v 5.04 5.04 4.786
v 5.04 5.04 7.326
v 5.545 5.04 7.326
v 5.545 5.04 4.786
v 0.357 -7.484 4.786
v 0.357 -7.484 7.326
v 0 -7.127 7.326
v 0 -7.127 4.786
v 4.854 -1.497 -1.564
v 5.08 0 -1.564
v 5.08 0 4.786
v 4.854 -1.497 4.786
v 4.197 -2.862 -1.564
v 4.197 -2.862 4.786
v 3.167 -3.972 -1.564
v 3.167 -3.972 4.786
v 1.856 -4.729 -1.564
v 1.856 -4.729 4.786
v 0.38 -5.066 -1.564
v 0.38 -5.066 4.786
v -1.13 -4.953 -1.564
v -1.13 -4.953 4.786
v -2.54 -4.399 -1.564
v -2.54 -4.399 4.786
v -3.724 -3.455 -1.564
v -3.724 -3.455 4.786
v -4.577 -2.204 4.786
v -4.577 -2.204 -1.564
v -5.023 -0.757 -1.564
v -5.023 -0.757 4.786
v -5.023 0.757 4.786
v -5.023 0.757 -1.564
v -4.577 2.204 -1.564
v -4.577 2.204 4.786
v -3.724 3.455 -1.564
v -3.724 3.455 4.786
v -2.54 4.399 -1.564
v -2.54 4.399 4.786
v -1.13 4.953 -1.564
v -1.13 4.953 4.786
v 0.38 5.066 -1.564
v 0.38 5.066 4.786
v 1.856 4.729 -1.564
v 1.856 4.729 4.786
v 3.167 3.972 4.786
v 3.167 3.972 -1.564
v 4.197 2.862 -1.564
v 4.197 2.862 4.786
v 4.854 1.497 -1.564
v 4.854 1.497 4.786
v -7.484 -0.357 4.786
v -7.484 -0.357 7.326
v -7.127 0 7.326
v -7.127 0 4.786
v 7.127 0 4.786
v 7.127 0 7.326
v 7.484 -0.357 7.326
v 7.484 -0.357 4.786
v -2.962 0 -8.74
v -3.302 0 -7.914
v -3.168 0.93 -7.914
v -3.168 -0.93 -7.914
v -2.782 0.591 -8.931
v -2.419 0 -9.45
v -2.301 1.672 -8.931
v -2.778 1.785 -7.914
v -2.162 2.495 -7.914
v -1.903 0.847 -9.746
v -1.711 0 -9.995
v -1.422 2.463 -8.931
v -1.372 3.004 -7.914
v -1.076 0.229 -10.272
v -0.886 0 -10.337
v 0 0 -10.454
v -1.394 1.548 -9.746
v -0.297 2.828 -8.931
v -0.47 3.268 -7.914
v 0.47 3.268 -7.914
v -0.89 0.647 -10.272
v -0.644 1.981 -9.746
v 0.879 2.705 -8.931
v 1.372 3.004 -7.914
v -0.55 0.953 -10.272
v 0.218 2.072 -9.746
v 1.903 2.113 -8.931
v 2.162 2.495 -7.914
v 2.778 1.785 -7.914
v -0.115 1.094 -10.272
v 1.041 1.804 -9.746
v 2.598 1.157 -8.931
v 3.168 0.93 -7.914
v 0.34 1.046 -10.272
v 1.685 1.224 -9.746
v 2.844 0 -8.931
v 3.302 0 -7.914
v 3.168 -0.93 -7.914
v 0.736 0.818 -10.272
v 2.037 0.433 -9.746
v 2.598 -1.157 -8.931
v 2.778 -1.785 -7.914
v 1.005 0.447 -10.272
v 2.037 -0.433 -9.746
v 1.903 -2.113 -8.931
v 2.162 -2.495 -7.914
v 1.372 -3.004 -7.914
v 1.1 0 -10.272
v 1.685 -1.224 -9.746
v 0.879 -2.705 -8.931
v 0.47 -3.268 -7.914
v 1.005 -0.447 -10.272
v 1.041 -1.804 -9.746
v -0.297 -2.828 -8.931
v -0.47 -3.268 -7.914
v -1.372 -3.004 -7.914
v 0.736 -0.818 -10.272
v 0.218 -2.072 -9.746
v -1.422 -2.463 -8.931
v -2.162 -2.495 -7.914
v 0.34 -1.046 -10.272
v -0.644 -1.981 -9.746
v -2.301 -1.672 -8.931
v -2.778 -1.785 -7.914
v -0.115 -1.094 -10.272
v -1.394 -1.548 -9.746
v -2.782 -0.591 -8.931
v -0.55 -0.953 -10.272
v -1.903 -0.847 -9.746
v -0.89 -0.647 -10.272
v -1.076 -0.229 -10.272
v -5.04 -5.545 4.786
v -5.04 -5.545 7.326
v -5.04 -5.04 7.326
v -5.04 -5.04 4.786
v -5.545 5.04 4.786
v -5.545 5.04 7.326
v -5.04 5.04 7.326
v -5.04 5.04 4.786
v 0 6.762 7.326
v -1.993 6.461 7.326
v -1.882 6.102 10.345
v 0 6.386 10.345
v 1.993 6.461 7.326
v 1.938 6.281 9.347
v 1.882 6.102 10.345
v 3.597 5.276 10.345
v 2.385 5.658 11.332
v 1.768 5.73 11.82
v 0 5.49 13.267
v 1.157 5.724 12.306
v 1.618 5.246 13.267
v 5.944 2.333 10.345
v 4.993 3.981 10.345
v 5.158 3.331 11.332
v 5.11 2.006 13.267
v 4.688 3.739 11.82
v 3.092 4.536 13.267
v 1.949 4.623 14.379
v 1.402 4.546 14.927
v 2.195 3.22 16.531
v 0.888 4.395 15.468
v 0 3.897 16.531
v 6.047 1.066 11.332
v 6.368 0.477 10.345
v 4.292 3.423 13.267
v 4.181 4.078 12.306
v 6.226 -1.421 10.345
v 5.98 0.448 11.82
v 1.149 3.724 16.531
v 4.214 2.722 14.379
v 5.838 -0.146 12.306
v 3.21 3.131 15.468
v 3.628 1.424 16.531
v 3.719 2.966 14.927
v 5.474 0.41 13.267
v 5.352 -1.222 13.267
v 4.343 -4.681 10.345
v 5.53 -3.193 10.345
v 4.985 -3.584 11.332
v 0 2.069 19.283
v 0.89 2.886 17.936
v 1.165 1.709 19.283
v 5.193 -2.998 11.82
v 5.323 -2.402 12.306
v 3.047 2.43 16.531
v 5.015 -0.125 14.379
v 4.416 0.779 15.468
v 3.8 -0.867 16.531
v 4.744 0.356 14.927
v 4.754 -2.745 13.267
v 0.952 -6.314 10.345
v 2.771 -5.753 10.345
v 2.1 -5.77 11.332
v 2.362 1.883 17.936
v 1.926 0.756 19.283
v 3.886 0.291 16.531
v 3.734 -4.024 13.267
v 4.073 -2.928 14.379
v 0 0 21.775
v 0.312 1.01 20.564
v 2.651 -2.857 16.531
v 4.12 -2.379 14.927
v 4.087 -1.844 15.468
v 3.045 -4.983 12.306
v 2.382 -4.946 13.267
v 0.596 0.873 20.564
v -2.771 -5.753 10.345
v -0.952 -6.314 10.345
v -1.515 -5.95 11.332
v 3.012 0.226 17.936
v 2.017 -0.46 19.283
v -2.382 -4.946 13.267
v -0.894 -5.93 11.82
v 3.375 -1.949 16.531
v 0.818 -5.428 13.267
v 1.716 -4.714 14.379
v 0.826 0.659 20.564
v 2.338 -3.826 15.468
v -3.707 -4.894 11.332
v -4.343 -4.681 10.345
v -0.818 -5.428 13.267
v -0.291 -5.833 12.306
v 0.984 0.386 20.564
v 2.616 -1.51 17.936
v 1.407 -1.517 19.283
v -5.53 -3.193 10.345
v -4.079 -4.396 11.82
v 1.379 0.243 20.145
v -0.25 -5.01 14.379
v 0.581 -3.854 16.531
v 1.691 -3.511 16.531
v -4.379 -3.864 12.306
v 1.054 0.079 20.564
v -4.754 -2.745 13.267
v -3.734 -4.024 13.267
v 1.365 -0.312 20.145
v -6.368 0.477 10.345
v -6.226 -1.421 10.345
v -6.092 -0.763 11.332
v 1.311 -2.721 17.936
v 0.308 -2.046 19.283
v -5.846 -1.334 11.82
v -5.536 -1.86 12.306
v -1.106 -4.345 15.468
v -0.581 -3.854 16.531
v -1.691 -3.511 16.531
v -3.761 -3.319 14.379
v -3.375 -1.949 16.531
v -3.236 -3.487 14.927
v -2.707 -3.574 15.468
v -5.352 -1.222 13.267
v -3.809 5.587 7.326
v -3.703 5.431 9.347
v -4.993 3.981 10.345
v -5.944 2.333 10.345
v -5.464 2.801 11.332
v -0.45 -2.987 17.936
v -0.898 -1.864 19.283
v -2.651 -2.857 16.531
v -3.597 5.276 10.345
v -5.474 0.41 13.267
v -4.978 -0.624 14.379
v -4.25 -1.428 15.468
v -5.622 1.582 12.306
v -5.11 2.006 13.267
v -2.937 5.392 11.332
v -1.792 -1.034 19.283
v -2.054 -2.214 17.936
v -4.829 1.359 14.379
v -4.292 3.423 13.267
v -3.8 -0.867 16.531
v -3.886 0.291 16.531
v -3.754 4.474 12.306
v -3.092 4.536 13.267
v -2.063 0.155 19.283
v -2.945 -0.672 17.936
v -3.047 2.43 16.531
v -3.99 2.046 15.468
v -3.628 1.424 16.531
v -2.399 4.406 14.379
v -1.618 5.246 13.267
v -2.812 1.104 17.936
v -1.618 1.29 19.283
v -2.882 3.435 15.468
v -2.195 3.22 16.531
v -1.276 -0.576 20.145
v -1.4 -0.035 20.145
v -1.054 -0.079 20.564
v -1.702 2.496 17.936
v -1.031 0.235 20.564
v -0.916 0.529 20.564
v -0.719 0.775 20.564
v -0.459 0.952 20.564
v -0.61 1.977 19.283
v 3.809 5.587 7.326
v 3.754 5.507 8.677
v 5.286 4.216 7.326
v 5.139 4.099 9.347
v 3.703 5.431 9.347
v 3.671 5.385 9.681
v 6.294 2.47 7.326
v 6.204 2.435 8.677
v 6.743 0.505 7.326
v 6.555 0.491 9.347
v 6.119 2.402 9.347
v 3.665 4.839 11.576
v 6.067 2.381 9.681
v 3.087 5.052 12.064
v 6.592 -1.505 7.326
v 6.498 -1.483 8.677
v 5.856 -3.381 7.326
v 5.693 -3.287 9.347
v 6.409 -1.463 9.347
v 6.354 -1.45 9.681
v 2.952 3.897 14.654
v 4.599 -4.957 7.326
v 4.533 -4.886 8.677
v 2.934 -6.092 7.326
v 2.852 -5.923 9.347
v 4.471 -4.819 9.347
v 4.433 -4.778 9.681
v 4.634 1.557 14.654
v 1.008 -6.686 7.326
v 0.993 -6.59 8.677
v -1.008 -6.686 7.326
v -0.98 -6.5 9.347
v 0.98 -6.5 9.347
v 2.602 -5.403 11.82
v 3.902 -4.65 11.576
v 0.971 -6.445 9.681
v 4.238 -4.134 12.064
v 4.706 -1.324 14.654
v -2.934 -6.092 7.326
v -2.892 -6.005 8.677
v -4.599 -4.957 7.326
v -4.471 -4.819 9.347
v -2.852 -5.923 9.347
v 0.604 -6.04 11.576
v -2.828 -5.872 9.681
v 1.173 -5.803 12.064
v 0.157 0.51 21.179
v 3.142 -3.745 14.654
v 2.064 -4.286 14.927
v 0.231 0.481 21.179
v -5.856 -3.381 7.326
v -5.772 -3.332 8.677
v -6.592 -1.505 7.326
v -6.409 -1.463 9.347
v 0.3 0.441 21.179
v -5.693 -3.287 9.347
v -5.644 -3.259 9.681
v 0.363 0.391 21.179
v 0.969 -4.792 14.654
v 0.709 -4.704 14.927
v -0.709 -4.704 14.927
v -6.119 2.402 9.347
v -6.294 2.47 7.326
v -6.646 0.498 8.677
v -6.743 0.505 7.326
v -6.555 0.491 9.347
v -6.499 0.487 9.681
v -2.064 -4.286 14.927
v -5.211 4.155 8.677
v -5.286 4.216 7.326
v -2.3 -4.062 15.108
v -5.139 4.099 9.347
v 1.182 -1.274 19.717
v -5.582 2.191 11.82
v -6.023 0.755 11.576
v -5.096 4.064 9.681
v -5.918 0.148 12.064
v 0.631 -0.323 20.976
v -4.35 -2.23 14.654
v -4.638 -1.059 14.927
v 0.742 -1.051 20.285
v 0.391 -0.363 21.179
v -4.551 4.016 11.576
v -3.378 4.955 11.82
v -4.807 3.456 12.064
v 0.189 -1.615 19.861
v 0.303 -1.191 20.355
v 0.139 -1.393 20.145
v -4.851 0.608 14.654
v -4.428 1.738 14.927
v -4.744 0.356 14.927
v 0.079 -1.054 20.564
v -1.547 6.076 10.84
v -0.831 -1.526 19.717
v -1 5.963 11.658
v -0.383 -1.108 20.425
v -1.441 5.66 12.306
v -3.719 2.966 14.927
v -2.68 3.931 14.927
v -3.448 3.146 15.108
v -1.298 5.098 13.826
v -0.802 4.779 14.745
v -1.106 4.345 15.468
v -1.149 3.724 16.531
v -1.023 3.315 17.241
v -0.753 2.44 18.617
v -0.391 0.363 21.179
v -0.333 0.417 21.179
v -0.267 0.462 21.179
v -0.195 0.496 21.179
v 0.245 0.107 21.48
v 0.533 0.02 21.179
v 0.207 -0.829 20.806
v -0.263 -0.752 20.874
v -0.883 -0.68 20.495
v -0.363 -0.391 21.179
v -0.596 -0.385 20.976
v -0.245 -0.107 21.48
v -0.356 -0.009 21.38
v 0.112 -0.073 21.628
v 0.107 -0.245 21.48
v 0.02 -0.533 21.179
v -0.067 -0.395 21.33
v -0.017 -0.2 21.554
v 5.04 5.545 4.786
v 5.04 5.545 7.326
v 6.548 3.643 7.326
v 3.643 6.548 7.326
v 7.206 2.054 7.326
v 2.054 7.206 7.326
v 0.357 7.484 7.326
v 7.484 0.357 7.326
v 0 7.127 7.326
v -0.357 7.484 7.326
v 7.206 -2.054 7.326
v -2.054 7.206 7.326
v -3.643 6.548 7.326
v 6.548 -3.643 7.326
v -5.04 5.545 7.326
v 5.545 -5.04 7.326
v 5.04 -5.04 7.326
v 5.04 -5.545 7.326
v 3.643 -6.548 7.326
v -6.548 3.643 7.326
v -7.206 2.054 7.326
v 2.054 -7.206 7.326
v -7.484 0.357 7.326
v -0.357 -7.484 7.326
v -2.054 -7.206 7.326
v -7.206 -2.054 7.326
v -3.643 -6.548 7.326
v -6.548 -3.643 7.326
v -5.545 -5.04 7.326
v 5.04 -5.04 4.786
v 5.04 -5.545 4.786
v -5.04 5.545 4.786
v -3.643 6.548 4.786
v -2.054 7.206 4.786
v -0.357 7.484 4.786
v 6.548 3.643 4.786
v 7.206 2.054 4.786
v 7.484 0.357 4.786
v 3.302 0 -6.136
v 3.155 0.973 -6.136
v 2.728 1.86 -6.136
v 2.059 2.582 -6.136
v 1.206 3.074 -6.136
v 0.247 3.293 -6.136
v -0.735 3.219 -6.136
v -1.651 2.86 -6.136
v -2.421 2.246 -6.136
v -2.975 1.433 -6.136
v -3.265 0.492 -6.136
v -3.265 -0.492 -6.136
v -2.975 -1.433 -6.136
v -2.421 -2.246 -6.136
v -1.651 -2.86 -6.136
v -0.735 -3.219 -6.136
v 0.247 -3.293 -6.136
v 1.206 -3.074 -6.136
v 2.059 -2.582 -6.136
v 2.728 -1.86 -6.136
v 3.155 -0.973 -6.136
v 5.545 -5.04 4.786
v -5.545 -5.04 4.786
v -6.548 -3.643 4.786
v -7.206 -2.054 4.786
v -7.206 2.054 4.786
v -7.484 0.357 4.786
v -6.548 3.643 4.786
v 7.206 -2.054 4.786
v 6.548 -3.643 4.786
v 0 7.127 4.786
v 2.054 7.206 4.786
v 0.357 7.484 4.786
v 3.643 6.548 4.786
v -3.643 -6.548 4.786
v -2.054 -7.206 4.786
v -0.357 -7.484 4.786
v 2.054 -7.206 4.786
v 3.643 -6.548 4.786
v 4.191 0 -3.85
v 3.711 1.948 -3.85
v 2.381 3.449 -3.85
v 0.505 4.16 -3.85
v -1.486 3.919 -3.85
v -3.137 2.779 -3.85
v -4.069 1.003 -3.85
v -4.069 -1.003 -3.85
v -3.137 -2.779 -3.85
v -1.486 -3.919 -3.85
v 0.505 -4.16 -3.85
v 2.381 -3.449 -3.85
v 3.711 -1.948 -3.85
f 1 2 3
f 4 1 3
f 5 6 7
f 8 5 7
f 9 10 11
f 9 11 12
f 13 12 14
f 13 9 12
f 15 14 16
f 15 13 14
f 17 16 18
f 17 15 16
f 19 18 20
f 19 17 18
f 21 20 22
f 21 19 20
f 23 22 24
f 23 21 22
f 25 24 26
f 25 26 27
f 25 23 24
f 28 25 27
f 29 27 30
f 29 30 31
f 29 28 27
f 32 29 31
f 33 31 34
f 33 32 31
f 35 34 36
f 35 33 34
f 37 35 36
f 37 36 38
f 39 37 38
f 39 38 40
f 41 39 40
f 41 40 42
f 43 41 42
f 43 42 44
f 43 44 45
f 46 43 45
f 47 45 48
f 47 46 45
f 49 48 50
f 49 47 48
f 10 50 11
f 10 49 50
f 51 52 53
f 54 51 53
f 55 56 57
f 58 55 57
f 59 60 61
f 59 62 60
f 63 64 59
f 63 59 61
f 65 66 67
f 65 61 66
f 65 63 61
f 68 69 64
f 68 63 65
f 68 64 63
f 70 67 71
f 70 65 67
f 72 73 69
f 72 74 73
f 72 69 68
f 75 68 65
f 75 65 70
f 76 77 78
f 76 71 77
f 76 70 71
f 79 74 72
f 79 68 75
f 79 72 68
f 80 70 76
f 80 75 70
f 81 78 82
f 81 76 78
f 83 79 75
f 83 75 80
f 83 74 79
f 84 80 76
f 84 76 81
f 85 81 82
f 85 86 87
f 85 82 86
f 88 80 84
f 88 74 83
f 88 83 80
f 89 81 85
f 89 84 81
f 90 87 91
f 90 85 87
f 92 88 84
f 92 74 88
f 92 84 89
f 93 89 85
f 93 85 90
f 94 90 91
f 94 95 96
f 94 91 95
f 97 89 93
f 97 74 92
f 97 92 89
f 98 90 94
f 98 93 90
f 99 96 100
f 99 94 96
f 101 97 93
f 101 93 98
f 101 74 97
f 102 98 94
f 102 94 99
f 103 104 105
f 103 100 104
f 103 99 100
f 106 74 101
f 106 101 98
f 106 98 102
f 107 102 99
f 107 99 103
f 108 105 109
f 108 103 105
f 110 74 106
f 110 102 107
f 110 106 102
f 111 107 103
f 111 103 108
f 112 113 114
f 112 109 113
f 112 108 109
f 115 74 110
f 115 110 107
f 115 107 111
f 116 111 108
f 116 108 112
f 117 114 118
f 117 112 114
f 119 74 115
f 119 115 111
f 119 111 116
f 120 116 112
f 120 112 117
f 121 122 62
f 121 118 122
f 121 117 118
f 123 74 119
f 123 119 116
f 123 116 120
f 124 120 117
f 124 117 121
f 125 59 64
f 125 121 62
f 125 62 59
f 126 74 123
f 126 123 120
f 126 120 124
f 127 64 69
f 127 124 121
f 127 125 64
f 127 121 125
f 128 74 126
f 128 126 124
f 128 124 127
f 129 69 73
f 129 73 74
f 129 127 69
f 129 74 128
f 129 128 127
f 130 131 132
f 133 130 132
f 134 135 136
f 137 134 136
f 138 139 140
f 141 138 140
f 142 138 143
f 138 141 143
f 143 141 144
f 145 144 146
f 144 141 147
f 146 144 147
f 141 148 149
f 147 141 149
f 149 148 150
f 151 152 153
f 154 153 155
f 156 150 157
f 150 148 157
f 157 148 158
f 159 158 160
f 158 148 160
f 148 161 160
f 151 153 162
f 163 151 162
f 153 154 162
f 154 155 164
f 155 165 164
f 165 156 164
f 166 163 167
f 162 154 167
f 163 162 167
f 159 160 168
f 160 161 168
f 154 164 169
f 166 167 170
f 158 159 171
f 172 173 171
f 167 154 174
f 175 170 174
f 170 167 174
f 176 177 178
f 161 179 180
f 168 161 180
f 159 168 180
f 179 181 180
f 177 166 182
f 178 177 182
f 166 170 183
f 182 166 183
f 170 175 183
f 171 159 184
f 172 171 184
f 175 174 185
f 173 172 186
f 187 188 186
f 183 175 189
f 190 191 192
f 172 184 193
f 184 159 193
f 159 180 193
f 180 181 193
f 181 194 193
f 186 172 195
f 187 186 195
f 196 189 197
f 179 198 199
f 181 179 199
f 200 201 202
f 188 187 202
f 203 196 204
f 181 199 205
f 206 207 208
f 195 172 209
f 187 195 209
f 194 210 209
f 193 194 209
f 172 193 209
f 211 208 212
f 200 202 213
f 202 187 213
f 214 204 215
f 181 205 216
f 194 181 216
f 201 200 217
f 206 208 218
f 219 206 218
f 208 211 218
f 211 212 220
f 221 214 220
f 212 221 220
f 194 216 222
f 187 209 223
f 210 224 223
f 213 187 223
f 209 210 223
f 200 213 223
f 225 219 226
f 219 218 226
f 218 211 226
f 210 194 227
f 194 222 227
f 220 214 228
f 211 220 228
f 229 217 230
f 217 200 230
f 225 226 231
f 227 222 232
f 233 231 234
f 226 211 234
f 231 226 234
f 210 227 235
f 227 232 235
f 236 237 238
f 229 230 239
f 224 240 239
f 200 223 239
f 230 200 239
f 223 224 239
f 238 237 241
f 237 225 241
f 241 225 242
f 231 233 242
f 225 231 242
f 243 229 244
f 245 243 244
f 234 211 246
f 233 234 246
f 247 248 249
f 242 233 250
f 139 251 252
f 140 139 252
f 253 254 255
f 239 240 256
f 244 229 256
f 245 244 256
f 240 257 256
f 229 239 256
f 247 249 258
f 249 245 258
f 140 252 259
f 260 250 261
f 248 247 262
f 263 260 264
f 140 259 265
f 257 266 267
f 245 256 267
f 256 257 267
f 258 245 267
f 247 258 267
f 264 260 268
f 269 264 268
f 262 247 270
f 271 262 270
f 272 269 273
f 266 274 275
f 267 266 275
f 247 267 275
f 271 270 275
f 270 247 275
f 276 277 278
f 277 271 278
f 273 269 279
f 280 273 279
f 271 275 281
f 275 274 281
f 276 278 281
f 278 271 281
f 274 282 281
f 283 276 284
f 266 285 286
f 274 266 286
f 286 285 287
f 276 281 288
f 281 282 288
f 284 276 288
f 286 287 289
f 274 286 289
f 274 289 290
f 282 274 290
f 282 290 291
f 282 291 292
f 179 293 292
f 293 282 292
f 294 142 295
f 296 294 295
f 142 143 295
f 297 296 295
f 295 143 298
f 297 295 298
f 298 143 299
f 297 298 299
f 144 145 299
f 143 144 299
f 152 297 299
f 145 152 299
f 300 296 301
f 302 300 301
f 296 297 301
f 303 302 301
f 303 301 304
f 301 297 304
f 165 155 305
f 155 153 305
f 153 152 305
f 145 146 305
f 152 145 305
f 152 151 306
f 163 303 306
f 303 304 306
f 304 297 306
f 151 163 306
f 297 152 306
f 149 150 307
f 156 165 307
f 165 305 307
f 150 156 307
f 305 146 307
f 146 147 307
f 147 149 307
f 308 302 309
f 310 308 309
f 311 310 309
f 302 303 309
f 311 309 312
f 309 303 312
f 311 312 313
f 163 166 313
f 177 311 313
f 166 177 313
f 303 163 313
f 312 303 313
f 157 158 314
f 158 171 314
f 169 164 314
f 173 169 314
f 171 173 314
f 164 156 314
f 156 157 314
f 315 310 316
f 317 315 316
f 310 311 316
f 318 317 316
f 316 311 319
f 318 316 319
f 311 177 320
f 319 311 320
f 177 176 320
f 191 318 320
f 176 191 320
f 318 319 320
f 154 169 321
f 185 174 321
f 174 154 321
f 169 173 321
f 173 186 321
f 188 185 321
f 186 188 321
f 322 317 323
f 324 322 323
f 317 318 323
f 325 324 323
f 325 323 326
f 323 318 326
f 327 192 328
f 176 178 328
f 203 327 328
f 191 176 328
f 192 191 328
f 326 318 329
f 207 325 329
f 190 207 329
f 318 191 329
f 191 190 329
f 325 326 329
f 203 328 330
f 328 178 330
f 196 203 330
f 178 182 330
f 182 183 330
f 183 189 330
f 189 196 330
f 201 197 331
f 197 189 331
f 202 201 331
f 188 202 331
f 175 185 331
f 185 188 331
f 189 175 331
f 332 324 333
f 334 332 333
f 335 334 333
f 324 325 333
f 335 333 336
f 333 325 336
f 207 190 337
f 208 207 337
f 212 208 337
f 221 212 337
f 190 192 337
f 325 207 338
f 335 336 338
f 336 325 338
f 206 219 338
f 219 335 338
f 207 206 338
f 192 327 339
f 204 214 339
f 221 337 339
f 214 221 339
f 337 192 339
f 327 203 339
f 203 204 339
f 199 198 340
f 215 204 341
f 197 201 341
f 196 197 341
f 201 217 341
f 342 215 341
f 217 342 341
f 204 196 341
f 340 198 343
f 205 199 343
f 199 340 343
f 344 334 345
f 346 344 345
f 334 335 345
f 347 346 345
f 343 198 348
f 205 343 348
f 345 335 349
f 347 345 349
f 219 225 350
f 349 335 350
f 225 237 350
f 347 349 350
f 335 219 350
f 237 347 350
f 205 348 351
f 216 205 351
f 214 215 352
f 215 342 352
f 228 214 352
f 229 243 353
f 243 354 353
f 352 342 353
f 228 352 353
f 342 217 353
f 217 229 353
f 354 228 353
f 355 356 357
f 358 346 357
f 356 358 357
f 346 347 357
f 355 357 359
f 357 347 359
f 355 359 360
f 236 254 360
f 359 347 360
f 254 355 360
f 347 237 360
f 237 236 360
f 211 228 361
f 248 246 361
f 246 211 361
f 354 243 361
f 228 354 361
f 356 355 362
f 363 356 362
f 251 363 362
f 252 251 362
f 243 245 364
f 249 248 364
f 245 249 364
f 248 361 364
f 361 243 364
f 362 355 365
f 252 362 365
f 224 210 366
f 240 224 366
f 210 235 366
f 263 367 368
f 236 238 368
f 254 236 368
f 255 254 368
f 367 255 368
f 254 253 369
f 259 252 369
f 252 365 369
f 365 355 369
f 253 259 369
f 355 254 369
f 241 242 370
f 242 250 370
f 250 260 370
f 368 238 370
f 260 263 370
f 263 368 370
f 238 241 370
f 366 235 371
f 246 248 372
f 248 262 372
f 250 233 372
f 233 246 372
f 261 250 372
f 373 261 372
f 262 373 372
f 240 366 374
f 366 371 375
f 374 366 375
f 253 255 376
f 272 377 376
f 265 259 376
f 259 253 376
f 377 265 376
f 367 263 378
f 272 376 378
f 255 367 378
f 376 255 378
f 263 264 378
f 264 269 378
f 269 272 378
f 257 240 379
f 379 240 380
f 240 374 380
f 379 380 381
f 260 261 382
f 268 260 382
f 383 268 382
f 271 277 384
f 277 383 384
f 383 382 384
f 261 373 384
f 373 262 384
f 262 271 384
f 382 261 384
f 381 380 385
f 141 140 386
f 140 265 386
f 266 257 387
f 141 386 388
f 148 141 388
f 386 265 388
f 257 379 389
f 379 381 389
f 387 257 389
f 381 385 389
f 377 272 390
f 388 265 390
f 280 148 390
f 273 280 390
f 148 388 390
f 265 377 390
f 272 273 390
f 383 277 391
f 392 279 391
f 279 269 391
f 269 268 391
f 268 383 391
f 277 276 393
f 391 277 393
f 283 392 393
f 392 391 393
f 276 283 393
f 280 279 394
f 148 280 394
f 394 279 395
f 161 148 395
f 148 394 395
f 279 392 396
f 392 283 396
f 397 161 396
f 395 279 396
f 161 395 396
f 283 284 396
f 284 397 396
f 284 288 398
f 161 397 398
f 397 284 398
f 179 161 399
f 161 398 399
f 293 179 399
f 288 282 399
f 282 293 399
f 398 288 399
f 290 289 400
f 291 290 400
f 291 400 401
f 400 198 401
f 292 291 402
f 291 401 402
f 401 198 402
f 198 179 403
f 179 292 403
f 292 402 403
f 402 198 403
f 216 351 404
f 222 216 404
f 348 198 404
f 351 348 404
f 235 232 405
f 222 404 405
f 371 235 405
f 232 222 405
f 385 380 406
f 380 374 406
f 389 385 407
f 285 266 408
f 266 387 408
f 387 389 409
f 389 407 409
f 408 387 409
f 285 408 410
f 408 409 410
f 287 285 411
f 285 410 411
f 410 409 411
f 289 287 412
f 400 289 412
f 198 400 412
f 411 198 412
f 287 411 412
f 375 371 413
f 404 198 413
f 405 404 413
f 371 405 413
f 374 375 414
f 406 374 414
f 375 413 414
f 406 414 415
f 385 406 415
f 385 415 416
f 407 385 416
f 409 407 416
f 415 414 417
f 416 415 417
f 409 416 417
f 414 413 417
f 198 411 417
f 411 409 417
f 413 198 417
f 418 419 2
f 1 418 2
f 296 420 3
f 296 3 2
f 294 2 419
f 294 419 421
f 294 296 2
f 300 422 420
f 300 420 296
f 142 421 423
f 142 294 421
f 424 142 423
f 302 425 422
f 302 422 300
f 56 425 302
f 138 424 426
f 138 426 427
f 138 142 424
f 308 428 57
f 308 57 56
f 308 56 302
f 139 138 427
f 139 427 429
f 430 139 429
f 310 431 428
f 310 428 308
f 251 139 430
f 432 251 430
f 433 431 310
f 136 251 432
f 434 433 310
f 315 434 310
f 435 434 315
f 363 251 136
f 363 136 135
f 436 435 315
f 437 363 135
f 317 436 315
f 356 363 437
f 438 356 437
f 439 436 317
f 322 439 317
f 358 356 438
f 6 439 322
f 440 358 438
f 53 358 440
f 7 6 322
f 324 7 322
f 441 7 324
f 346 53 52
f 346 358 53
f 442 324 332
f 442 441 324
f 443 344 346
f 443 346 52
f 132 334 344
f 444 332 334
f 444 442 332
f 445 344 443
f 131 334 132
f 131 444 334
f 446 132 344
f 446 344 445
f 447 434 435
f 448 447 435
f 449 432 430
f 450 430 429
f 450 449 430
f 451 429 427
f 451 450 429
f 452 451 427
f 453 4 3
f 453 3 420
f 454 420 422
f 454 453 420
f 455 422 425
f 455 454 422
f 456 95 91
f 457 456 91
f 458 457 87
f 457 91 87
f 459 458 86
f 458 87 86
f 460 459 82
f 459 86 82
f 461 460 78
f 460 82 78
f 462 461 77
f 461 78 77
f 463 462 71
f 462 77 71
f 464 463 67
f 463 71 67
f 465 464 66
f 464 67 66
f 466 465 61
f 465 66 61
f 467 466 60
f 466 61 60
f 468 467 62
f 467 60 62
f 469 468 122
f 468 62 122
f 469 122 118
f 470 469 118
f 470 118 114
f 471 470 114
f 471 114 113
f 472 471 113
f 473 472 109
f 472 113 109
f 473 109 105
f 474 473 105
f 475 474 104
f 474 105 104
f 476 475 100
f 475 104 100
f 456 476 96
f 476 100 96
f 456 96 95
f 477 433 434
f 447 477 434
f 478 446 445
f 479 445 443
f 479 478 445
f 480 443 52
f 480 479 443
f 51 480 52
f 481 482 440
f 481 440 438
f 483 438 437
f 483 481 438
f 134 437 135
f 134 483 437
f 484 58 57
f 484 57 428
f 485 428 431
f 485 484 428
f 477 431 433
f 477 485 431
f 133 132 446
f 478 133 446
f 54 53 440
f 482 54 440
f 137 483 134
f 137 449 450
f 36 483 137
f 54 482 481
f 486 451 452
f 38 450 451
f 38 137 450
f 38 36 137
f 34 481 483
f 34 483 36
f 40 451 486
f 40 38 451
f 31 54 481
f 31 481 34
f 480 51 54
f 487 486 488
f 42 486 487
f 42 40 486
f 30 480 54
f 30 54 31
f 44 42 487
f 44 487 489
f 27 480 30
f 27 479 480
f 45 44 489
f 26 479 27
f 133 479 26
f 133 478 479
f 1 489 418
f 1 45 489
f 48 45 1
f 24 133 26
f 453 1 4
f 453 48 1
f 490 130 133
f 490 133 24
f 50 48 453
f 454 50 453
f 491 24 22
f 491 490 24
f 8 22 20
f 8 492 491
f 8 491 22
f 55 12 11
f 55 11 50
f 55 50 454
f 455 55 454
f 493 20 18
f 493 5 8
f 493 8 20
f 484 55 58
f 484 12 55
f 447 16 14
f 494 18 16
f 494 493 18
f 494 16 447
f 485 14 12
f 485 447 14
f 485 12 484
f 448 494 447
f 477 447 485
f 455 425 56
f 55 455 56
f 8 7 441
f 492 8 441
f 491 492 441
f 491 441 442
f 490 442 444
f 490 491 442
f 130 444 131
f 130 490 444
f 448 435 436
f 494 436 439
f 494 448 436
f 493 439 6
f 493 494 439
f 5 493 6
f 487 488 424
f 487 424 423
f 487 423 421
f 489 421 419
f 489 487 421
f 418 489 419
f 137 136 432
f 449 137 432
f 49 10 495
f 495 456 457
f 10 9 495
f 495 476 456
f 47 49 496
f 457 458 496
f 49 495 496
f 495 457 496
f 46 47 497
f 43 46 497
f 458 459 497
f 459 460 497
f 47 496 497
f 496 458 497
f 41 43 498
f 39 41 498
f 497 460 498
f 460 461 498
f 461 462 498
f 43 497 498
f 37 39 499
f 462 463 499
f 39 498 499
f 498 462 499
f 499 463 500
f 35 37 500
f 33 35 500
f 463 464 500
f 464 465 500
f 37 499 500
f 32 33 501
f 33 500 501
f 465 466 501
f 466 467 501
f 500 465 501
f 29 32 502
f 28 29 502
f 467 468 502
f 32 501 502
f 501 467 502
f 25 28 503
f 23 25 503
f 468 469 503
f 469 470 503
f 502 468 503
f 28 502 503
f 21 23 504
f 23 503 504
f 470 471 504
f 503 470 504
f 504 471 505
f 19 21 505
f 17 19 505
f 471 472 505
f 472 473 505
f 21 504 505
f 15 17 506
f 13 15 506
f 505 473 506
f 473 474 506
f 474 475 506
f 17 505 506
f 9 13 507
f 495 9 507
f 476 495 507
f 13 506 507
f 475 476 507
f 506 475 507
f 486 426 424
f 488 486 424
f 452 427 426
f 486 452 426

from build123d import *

# Parameters (mm, degrees)
DOME1_FACE_RADIUS  = 3.302
DOME1_HEIGHT       = 2.54
CUT_EXTRUDE4_DEPTH = 21.698272826
SEEDCUT_COUNT      = 8


# Read off the part's stored shape, not the designer's step: Cut-Revolve-Thin7
with BuildPart() as part:
    # Sketch1 → Revolve5 (revolve)
    with BuildSketch(Plane(origin=(0, 0, 0), x_dir=(0, 0, -1), z_dir=(1, 0, 0)), mode=Mode.PRIVATE) as revolve5_sk:
        Polygon((-7.325846616, 0), (-7.325846616, 7.493), (-4.785846616, 7.493), (-4.785846616, 5.08), (7.914153384, 5.08), (7.914153384, 0), align=None)
    revolve(revolve5_sk.sketch.rotate(Axis((0, 0, 20.020603184), (0, 0, -1)), 90), axis=Axis((0, 0, 20.020603184), (0, 0, -1)))

    # Sketch2 → Revolve12 (revolve)
    with BuildSketch(Plane(origin=(0, 0, 0), x_dir=(0, 0, -1), z_dir=(1, 0, 0))):
        with BuildLine():
            Line((-7.325846616, 0), (-21.775464383, 0))
            add(Edge.make_bspline(
                [(-7.325846616, 6.761687124), (-12.74249131, 6.612472482), (-17.889702324, 3.558506137), (-21.775464383, 0)],
                knots=[0, 0, 0, 0, 1, 1, 1, 1], degree=3))
            Line((-7.325846616, 6.761687124), (-7.325846616, 0))
        make_face()
    revolve(axis=Axis((0, 0, 22.807457961), (0, 0, -1)))

    # Cut-Revolve-Thin7 outline → Cut-Revolve-Thin7 (revolve, cut)
    with BuildSketch(Plane.XZ):
        Polygon((3.302, -6.136153384), (3.302, -7.914153384), (5.08, -7.914153384), (5.08, -1.564153384), align=None)
    revolve(axis=Axis((0, 0, 0), (0, 0, 1)), mode=Mode.SUBTRACT)

    # Dome1: a dome of height H over a round flat face of radius A is a cap of a sphere of radius (A * A + H * H) / (2 * H)
    dome1_r = (DOME1_FACE_RADIUS * DOME1_FACE_RADIUS + DOME1_HEIGHT * DOME1_HEIGHT) / (2 * DOME1_HEIGHT)
    dome1_base = Plane((0, 0, -7.914153384), z_dir=(0, 0, -1))
    with Locations(dome1_base.offset(DOME1_HEIGHT - dome1_r)):
        dome1_ball = Sphere(dome1_r, mode=Mode.PRIVATE)
    add(split(dome1_ball, bisect_by=dome1_base, keep=Keep.TOP, mode=Mode.PRIVATE))

    # Sketch6 → Cut-Extrude4 (cut, through all)
    with BuildSketch(Plane.XY.offset(7.325846616)):
        with BuildLine():
            Line((0, 7.127343562), (0.357140372, 7.484483934))
            ThreePointArc((0.357140372, 7.484483934), (0, 7.493), (-0.357140372, 7.484483934))
            Line((-0.357140372, 7.484483934), (0, 7.127343562))
        make_face()
    cut_extrude4 = extrude(amount=-CUT_EXTRUDE4_DEPTH, mode=Mode.SUBTRACT)

    # SeedCut: Cut-Extrude4 ×8 about axis
    seedcut_axis = Axis((0, 0, 0), (0, 0, 1))
    for i in range(1, SEEDCUT_COUNT):
        add(cut_extrude4.rotate(seedcut_axis, i * 360 / SEEDCUT_COUNT), mode=Mode.SUBTRACT)


solid = part.part
